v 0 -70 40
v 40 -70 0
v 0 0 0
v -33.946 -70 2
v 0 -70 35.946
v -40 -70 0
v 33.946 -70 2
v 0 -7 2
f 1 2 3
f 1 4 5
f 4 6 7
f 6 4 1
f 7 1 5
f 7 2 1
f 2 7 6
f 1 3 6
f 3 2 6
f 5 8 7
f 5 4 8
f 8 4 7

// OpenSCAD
$fn=30 * 1;

width=80;    // [25:200]
height=70;   // [25:200]
depth=40;    // [5:200]
thickness=2; // [0.5:5]
with_nailmount="no"; // [yes,no]

module poly(x1, x2, x3, y1, y2, z1, z2) {
    polyhedron(
        points=[
            [x1, y1, z1],  // 0
            [x2, y1, z2],  // 1
            [x3, y1, z2],  // 2
            [x1, y2, z2]], // 3
        faces=[[3, 0, 1],
               [3, 1, 2],
               [2, 0, 3],
               [1, 2, 3],
               [1, 0, 2]]);
}

module nailmount(d) {
    ot = d - .3;
    it = d - ot;
    rotate([90, 270, 0]) {
        // Outside (uneven circles)
       hull() {
            translate([d, 0, 0]) cylinder(h=d, r=2.5);
            translate([3 + d, 0, 0]) cylinder(h=d, r=1.5);
        }
        // Inside bits (even circles)
        hull() {
            translate([d, 0, 0]) cylinder(h=ot, r=2.5);
            translate([3 + d, 0]) cylinder(h=ot, r=2.5);
        }
    }
}

module vase(w, h, d, t) {
    ih = (d - (2*t)) / (d/h);
    iw = (d - (2*t)) / (d / (w/2));
    rotate([90, 0, 0]) {
        difference() {
            poly(0, w/2, -w/2, 0, d, 0, h);
            poly(0, iw-t, -iw+t, t, d-(2*t), h-ih, h+.1);
        }
    }
}

module vase_with_nailmount(w, h, d, t) {
    difference() {
        vase(w, h, d, t);
        translate([0, t-.20001, h*.75]) nailmount(t-.2);
    }
}

if (with_nailmount == "yes") {
    vase_with_nailmount(width, h=height, d=depth, t=thickness);
} else {
    vase(width, h=height, d=depth, t=thickness);
}
